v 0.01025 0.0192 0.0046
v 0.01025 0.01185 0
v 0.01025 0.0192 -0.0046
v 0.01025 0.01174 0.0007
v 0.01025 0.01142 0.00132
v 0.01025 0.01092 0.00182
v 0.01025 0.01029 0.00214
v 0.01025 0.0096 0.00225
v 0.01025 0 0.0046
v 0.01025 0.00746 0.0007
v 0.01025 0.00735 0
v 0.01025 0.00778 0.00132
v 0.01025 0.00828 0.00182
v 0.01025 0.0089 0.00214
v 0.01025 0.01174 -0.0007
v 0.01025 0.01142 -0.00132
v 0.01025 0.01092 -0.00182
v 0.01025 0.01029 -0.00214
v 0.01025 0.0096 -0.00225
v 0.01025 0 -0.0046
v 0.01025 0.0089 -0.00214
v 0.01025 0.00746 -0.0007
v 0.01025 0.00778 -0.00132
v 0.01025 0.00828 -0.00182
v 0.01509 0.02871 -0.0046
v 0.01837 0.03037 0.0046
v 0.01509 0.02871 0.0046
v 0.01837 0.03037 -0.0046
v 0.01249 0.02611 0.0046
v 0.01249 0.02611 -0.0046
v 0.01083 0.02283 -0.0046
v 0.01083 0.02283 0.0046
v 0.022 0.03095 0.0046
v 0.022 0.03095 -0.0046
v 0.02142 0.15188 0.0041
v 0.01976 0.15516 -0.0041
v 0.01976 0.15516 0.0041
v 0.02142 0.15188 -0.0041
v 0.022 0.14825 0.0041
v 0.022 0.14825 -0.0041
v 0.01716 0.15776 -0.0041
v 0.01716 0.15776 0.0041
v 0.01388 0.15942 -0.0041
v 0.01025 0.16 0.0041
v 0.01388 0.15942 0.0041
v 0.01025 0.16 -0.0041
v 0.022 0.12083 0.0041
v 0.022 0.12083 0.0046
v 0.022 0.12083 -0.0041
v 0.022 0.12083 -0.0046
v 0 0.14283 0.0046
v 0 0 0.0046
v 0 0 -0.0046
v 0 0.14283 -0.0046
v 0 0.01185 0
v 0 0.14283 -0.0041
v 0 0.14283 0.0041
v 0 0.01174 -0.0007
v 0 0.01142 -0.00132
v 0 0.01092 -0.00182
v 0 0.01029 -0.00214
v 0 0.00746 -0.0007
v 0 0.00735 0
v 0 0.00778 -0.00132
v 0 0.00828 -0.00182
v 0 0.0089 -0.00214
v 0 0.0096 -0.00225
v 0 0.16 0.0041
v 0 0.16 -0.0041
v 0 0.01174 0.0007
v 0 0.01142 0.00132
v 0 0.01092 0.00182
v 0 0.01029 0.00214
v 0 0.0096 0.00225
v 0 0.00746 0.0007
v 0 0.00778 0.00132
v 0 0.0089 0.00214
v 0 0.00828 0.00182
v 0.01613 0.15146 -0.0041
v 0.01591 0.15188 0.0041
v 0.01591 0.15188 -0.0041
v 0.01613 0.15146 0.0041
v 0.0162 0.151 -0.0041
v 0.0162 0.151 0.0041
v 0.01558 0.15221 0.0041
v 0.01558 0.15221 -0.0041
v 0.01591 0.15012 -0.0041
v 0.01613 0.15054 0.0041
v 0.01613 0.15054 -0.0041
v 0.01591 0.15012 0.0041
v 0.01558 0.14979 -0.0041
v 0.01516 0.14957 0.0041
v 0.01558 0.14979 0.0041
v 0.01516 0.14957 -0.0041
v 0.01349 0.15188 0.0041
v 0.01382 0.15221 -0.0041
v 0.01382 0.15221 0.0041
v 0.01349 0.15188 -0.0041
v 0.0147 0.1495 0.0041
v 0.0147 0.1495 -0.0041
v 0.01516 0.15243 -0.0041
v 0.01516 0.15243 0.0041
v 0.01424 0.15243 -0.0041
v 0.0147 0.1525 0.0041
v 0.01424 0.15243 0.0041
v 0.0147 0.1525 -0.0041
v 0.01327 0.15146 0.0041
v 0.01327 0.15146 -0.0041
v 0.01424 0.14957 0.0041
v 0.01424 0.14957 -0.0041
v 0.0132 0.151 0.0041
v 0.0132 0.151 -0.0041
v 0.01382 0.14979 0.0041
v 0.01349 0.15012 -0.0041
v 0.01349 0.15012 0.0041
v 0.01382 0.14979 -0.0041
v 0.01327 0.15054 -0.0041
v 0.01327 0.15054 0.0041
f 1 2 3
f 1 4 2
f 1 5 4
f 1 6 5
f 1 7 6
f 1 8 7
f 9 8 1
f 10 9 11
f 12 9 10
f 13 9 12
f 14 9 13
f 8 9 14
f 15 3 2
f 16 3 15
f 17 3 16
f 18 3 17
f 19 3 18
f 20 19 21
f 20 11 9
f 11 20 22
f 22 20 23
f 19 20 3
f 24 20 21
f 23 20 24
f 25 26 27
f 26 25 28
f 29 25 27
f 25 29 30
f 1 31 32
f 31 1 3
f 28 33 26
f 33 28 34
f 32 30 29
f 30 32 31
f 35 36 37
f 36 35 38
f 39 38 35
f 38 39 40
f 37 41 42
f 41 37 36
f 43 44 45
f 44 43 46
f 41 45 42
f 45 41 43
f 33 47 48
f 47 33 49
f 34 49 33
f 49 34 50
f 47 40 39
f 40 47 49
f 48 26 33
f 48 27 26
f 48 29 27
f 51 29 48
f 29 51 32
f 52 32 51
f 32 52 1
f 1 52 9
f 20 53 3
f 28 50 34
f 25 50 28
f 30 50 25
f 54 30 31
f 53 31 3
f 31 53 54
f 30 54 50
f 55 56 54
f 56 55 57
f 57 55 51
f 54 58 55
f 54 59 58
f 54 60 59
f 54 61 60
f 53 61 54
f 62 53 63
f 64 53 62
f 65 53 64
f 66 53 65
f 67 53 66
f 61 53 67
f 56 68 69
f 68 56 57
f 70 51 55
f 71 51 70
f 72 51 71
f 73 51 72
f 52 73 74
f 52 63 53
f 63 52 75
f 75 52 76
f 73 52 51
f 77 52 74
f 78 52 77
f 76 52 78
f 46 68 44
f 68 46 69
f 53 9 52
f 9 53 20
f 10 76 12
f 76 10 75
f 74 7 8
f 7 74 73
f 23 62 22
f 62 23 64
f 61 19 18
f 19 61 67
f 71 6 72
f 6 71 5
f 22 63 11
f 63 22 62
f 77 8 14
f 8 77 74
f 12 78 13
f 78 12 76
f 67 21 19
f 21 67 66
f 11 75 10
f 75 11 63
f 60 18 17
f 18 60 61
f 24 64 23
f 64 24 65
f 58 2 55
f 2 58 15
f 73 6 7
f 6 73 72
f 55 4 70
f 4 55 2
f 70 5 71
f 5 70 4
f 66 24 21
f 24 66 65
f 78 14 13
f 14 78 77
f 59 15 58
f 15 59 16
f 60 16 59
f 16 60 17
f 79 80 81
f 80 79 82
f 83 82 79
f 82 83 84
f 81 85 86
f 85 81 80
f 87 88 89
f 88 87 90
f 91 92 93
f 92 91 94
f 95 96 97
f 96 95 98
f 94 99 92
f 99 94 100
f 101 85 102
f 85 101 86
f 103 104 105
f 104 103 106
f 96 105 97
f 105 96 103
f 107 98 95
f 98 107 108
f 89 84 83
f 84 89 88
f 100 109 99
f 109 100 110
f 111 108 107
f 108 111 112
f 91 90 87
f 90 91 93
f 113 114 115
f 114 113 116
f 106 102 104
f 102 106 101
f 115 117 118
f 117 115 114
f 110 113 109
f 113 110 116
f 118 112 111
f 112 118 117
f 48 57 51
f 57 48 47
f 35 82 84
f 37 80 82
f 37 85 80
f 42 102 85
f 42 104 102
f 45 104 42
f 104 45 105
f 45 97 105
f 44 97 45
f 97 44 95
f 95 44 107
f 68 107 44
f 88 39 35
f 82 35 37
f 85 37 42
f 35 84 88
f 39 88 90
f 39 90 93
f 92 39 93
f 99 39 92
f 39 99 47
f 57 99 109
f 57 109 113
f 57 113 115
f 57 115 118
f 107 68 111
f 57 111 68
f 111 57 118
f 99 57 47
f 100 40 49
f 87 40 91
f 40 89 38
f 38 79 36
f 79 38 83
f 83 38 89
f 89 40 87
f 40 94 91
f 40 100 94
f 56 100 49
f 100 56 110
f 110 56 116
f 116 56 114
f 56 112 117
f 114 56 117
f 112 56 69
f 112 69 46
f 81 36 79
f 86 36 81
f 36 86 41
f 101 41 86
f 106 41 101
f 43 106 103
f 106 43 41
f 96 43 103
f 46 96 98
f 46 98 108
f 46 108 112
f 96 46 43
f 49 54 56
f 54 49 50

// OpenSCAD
// file: chinook.scad
module chinook()
{
    difference()
    {
        base_cube(length);
        tab_cut();
        screw_cut();
        back_round_cut(length);
        pin_cut(length);
        thickness_cut(length, thick/2);
        thickness_cut(length, -thick/2);
    }
}

module base_cube(BaseLength)
{
    translate([0,0,-thick/2])
    cube(size=[height,
               BaseLength,
               thick],
         center=false);
}

module tab_cut()
{
    translate([tab_height,0,-thick/2*1.1])
    union()
    {
        translate([0,-thick,0])
        cube(size=[height,
                   tab_length+thick,
                   thick*1.1],
             center=false);
        translate([tab_round,tab_length,0])
        cylinder(h=thick*1.1,
                 r=tab_round,
                 center=false);
    }
}

module screw_cut()
{
    translate([tab_height/2,screw_pos,0])
    rotate([0,90,0])
    cylinder(h=tab_height*1.1,
             d=screw_dia,
             center=true);
}

module back_round_cut(BaseLength)
{
    translate([height-tab_round,
               BaseLength-tab_round,
               -thick/2*1.1])
    difference()
    {
        cube(size=[tab_round*1.1,
                   tab_round*1.1,
                   thick*1.1],
             center=false);
        cylinder(h=thick*1.2,
                 r=tab_round,
                 center=false);
    }
}

module pin_cut(BaseLength)
{
    translate([pin_depth,
               BaseLength-pin_back,
               0])
    rotate([0,0,0])
    cylinder(h=tab_height*1.1,
             d=pin_dia,
             center=true);
}

module thickness_cut(BaseLength, zOffset)
{
    translate([pin_depth,
               BaseLength-pin_back,
               zOffset])
    rotate([0,0,45])
    cube(size=[pin_depth*2.2,
               height*3,
               thick_cut],
         center=true);
}
// main file
// Dimensions in m (SI)
length = 0.16;
height = 0.022;
thick  = 0.0092;

screw_pos = 0.0096;
screw_dia = 0.0045;

tab_height = 0.01025;
tab_length = screw_pos * 2;
tab_round  = height-tab_height;

// real pin: d=0.0048 -> drill to fit
pin_dia   = 0.003;
pin_depth = 0.0147;
pin_back  = 0.009;

// Thickness to cut for easier sliding (0 for no cut)
thick_cut = 0.001;

// face resolution for curved surfaces
$fn=20;

// instantiate
include <chinook.scad>
chinook();
